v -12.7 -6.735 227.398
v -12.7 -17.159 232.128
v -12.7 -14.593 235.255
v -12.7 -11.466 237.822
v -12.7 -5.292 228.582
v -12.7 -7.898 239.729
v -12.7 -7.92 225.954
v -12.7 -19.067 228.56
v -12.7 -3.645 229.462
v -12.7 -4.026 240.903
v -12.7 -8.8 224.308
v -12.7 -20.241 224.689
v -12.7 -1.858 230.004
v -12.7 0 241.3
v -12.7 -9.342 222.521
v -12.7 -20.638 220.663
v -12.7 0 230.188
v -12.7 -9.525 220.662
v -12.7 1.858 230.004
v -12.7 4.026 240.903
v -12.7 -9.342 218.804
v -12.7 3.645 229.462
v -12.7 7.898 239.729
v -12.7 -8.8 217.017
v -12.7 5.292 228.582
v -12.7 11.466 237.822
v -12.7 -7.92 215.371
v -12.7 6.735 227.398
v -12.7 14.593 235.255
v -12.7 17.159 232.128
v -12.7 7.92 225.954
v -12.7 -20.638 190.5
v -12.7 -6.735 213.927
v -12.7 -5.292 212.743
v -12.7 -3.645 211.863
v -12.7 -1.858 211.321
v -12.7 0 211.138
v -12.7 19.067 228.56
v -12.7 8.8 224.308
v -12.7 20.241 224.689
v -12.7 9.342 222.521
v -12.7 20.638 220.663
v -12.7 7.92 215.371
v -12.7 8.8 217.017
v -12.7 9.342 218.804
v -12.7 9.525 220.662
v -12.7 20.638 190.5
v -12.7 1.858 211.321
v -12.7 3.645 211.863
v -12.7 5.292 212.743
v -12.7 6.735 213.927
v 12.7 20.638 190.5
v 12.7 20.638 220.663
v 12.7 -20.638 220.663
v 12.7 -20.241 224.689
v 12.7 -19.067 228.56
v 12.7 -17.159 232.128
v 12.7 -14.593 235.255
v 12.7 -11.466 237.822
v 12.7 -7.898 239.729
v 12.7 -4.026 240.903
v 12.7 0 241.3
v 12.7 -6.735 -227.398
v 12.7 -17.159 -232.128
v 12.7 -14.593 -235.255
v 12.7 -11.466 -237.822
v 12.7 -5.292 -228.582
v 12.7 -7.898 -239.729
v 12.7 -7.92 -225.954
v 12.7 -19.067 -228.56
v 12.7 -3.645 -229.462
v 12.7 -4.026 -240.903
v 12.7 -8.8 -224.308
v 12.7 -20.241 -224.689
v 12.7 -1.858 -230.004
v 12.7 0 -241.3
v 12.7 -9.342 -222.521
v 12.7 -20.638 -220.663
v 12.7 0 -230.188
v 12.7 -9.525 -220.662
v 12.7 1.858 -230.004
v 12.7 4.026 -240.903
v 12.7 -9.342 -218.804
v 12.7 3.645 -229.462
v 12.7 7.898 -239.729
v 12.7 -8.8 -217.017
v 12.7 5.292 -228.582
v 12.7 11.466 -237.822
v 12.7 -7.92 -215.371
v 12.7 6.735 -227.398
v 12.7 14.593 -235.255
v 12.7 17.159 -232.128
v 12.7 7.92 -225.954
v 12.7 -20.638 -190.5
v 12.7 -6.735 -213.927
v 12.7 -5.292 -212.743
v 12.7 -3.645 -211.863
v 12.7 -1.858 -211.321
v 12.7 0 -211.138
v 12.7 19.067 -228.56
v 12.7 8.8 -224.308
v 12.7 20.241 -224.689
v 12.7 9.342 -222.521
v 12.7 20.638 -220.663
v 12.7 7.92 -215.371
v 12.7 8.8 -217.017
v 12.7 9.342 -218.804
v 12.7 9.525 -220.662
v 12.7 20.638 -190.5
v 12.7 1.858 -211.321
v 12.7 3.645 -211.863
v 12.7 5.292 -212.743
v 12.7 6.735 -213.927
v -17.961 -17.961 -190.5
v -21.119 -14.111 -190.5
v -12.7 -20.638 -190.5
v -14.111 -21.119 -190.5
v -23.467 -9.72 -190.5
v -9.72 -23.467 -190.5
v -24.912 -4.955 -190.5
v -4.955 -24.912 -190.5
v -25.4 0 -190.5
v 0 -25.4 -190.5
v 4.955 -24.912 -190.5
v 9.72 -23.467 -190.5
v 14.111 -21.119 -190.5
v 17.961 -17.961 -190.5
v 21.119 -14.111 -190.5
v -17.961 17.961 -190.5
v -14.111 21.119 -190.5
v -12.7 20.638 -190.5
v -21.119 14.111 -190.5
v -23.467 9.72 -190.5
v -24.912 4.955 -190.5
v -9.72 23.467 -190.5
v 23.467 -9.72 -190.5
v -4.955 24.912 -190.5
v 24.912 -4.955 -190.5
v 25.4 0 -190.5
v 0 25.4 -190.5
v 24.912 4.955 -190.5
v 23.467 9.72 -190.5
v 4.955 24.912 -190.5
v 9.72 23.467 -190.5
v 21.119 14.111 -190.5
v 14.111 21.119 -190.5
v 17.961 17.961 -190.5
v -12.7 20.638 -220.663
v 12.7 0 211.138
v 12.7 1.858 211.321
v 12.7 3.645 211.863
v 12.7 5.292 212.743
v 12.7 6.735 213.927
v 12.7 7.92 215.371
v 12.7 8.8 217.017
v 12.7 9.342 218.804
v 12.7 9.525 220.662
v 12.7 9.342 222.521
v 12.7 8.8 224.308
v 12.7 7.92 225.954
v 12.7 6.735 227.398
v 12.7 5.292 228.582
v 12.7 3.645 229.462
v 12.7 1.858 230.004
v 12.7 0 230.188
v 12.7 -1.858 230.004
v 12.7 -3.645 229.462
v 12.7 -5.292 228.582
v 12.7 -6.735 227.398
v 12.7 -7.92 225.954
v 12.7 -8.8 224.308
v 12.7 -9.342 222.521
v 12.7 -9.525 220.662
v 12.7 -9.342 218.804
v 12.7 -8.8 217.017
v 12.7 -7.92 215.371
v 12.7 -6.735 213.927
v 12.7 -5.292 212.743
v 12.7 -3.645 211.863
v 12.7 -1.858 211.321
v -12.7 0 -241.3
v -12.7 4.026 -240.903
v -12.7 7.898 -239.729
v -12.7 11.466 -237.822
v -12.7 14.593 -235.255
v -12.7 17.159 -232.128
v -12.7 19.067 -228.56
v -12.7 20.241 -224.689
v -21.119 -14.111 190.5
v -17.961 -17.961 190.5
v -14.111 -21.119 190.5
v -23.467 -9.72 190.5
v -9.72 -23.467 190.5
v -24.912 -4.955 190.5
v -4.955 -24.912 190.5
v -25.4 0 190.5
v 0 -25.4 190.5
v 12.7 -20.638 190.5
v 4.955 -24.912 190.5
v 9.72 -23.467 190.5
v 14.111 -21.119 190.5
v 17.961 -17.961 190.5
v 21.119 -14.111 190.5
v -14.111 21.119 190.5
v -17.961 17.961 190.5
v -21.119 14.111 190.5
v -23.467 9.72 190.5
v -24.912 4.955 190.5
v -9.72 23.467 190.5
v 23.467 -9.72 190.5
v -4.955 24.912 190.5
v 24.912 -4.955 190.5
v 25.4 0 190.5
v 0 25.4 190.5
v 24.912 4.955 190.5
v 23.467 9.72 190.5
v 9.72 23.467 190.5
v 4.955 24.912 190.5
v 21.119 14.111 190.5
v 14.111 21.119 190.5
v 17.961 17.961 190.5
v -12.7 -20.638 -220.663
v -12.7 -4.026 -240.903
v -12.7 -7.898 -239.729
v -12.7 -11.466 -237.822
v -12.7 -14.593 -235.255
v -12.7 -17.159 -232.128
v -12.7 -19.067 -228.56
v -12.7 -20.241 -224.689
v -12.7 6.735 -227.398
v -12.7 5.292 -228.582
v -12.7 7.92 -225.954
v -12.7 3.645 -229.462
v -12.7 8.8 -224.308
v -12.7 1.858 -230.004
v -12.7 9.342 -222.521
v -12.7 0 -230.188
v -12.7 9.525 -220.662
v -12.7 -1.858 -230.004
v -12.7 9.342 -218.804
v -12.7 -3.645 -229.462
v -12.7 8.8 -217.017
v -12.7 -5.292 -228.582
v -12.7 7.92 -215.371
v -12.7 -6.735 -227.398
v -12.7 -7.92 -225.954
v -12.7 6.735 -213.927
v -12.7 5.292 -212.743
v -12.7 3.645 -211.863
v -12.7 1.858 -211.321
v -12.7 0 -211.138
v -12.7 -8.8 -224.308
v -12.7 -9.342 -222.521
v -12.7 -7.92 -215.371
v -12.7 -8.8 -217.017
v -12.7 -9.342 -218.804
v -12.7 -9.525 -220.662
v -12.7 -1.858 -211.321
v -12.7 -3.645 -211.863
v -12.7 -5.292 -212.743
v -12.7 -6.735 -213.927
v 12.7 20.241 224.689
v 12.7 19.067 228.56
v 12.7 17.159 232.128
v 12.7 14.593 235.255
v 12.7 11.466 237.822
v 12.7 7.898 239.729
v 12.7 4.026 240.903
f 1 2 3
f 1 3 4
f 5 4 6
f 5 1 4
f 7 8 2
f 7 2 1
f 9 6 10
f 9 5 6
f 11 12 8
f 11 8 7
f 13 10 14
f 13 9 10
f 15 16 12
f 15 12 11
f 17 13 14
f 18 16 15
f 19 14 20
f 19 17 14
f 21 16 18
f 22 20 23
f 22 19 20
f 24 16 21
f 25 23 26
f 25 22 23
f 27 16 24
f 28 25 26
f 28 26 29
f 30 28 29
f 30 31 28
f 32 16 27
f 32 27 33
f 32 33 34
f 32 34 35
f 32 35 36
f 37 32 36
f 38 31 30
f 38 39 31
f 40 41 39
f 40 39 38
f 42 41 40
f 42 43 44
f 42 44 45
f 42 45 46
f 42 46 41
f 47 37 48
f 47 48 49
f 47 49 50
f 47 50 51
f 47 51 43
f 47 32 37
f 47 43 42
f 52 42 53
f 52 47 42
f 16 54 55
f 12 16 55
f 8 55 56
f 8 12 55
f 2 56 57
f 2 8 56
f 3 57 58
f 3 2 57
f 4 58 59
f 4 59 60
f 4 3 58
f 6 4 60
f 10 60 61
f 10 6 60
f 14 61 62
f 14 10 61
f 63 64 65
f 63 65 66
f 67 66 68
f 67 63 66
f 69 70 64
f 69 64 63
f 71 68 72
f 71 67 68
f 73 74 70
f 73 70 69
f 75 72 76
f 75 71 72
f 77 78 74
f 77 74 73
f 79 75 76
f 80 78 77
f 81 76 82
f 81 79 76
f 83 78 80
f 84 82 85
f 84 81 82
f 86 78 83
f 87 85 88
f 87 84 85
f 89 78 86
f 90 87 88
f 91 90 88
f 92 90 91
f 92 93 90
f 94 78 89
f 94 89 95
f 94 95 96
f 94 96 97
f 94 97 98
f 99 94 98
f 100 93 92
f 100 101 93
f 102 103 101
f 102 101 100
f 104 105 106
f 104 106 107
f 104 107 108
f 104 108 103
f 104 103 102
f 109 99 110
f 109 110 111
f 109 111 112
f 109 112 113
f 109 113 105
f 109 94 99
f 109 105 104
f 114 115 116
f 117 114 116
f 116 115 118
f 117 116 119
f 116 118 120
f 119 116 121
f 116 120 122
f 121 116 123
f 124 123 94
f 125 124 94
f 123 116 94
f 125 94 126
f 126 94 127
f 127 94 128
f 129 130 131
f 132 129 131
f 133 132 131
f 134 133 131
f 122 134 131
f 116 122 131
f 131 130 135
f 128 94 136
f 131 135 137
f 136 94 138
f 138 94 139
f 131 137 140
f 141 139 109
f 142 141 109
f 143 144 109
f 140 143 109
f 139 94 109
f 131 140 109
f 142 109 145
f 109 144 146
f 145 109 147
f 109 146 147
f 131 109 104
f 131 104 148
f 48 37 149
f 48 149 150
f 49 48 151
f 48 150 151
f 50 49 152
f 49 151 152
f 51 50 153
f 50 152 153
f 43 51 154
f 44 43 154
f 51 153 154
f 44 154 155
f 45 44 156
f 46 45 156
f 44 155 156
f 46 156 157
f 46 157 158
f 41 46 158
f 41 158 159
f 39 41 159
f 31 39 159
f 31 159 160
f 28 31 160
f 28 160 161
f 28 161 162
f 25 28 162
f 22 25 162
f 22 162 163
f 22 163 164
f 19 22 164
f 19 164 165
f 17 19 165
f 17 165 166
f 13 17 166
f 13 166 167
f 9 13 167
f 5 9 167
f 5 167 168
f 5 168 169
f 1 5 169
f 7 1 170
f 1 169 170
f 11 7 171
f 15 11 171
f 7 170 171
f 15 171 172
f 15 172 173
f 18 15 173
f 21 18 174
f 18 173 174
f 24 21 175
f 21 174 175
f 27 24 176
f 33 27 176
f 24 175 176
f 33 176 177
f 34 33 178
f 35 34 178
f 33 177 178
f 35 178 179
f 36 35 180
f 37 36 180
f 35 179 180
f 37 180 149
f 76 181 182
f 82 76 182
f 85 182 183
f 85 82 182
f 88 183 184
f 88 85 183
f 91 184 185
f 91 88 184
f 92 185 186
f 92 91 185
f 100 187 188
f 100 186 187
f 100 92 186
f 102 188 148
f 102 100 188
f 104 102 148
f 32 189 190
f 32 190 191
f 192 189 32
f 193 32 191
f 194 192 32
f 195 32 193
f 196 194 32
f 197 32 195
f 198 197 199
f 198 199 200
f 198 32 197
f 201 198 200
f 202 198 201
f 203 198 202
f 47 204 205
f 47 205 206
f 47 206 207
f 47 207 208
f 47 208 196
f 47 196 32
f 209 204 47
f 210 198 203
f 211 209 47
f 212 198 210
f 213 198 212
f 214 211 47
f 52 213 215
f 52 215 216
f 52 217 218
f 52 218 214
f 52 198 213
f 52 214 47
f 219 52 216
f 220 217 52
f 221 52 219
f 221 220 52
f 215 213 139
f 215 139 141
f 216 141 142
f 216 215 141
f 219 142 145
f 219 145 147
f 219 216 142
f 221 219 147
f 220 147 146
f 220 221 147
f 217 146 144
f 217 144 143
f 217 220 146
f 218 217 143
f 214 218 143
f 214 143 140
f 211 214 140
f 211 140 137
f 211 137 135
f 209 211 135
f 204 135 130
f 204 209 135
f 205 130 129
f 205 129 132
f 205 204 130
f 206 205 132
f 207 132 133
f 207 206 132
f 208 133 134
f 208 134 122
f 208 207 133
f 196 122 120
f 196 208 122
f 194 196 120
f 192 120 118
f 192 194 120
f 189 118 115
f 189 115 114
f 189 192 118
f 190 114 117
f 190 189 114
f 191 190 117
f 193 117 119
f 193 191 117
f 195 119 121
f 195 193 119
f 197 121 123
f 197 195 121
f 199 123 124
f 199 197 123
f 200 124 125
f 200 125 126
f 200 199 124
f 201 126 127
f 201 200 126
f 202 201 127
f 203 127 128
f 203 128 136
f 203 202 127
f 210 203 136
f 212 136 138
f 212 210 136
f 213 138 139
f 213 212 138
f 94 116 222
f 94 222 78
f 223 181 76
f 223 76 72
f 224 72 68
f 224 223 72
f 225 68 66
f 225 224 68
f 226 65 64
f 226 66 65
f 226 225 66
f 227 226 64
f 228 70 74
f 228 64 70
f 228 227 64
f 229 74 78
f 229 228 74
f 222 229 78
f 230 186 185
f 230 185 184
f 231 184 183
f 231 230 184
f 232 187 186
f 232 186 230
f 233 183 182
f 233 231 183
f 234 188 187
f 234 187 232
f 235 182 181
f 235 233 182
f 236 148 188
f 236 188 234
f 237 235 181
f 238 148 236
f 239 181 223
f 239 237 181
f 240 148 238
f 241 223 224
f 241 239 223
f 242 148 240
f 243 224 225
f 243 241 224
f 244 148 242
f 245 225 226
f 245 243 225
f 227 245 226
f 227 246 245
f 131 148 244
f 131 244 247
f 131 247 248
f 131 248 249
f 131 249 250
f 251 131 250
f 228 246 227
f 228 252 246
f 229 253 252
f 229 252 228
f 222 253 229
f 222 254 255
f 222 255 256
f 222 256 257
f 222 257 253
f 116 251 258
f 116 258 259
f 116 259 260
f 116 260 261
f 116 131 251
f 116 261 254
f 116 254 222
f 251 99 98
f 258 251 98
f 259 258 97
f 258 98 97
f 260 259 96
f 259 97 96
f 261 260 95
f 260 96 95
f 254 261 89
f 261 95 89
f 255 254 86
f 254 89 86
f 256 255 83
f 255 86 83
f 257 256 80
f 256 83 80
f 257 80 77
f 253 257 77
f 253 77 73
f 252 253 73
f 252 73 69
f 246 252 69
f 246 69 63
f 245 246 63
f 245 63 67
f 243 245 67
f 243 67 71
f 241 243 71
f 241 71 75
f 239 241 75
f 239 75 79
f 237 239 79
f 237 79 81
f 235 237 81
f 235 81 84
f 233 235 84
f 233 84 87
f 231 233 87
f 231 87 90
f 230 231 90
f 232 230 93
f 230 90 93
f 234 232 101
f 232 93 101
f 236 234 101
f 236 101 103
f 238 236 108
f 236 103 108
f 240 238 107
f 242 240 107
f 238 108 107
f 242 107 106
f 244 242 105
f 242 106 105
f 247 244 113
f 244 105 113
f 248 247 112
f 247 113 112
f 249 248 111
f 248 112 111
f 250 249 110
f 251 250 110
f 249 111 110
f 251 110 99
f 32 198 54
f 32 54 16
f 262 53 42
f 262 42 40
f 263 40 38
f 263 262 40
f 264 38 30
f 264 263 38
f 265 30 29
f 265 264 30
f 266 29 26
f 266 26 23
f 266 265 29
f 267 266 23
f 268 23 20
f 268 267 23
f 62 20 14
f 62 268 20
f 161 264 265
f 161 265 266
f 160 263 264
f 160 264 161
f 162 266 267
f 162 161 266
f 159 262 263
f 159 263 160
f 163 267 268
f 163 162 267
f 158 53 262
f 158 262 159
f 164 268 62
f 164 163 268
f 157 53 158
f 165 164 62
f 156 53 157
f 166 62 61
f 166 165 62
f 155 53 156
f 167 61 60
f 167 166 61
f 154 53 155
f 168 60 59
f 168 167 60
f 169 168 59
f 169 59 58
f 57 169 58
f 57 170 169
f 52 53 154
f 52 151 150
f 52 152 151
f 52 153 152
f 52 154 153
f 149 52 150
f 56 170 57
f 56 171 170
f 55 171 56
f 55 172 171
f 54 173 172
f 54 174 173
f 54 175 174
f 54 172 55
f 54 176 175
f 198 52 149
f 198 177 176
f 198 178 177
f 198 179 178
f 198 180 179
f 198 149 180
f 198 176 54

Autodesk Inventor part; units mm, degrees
ref_plane "YZ Plane" through (0, 0, 0) normal (1, 0, 0) x (0, 1, 0)
ref_plane "XZ Plane" through (0, 0, 0) normal (0, 1, 0) x (-1, 0, 0)
ref_plane "XY Plane" through (0, 0, 0) normal (0, 0, 1) x (1, 0, 0)
sketch "Sketch1" plane through (0, 0, 0) normal (0, 0, 1) x (1, 0, 0)
  circle A0 centre (0, 0) radius 25.4
  dimension "d0" = 50.8
extrude "Extrusion1" add sketch "Sketch1" along normal mid plane 381
sketch "Sketch4" plane through (0, 0, 190.5) normal (0, 0, 1) x (1, 0, 0)
  line L0 (-12.7, 20.6375) -> (12.7, 20.6375)
  line L1 (12.7, 20.6375) -> (12.7, -20.6375)
  line L2 (12.7, -20.6375) -> (-12.7, -20.6375)
  line L3 (-12.7, -20.6375) -> (-12.7, 20.6375)
  line L4 (-12.7, 20.6375) -> (12.7, -20.6375) construction
  line L5 (12.7, 20.6375) -> (-12.7, -20.6375) construction
  point P0 (0, 0)
  dimension "d15" = 25.4
  dimension "d16" = 41.275
extrude "Extrusion4" add sketch "Sketch4" along normal blind 50.8
fillet "Fillet2" radius 20.6375 2 edges at (0, 20.6375, 241.3) (0, -20.6375, 241.3)
sketch "Sketch5" plane through (12.7, -20.6375, 190.5) normal (1, 0, 0) x (0, 0, -1)
  arc A0 (-30.1625, 41.275) -> (-30.1625, 0) centre (-30.1625, 20.6375) ccw projected
  circle A1 centre (-30.1625, 20.6375) radius 9.525
  point P0 (190.5, 20.6375)
extrude "Extrusion5" cut sketch "Sketch5" against normal blind 50.8
mirror "Mirror1" about plane through (0, 0, 0) normal (0, 0, 1) of "Extrusion4", "Fillet2", "Extrusion5"
properties part number "body to wheel hub connectors (19 in)"
